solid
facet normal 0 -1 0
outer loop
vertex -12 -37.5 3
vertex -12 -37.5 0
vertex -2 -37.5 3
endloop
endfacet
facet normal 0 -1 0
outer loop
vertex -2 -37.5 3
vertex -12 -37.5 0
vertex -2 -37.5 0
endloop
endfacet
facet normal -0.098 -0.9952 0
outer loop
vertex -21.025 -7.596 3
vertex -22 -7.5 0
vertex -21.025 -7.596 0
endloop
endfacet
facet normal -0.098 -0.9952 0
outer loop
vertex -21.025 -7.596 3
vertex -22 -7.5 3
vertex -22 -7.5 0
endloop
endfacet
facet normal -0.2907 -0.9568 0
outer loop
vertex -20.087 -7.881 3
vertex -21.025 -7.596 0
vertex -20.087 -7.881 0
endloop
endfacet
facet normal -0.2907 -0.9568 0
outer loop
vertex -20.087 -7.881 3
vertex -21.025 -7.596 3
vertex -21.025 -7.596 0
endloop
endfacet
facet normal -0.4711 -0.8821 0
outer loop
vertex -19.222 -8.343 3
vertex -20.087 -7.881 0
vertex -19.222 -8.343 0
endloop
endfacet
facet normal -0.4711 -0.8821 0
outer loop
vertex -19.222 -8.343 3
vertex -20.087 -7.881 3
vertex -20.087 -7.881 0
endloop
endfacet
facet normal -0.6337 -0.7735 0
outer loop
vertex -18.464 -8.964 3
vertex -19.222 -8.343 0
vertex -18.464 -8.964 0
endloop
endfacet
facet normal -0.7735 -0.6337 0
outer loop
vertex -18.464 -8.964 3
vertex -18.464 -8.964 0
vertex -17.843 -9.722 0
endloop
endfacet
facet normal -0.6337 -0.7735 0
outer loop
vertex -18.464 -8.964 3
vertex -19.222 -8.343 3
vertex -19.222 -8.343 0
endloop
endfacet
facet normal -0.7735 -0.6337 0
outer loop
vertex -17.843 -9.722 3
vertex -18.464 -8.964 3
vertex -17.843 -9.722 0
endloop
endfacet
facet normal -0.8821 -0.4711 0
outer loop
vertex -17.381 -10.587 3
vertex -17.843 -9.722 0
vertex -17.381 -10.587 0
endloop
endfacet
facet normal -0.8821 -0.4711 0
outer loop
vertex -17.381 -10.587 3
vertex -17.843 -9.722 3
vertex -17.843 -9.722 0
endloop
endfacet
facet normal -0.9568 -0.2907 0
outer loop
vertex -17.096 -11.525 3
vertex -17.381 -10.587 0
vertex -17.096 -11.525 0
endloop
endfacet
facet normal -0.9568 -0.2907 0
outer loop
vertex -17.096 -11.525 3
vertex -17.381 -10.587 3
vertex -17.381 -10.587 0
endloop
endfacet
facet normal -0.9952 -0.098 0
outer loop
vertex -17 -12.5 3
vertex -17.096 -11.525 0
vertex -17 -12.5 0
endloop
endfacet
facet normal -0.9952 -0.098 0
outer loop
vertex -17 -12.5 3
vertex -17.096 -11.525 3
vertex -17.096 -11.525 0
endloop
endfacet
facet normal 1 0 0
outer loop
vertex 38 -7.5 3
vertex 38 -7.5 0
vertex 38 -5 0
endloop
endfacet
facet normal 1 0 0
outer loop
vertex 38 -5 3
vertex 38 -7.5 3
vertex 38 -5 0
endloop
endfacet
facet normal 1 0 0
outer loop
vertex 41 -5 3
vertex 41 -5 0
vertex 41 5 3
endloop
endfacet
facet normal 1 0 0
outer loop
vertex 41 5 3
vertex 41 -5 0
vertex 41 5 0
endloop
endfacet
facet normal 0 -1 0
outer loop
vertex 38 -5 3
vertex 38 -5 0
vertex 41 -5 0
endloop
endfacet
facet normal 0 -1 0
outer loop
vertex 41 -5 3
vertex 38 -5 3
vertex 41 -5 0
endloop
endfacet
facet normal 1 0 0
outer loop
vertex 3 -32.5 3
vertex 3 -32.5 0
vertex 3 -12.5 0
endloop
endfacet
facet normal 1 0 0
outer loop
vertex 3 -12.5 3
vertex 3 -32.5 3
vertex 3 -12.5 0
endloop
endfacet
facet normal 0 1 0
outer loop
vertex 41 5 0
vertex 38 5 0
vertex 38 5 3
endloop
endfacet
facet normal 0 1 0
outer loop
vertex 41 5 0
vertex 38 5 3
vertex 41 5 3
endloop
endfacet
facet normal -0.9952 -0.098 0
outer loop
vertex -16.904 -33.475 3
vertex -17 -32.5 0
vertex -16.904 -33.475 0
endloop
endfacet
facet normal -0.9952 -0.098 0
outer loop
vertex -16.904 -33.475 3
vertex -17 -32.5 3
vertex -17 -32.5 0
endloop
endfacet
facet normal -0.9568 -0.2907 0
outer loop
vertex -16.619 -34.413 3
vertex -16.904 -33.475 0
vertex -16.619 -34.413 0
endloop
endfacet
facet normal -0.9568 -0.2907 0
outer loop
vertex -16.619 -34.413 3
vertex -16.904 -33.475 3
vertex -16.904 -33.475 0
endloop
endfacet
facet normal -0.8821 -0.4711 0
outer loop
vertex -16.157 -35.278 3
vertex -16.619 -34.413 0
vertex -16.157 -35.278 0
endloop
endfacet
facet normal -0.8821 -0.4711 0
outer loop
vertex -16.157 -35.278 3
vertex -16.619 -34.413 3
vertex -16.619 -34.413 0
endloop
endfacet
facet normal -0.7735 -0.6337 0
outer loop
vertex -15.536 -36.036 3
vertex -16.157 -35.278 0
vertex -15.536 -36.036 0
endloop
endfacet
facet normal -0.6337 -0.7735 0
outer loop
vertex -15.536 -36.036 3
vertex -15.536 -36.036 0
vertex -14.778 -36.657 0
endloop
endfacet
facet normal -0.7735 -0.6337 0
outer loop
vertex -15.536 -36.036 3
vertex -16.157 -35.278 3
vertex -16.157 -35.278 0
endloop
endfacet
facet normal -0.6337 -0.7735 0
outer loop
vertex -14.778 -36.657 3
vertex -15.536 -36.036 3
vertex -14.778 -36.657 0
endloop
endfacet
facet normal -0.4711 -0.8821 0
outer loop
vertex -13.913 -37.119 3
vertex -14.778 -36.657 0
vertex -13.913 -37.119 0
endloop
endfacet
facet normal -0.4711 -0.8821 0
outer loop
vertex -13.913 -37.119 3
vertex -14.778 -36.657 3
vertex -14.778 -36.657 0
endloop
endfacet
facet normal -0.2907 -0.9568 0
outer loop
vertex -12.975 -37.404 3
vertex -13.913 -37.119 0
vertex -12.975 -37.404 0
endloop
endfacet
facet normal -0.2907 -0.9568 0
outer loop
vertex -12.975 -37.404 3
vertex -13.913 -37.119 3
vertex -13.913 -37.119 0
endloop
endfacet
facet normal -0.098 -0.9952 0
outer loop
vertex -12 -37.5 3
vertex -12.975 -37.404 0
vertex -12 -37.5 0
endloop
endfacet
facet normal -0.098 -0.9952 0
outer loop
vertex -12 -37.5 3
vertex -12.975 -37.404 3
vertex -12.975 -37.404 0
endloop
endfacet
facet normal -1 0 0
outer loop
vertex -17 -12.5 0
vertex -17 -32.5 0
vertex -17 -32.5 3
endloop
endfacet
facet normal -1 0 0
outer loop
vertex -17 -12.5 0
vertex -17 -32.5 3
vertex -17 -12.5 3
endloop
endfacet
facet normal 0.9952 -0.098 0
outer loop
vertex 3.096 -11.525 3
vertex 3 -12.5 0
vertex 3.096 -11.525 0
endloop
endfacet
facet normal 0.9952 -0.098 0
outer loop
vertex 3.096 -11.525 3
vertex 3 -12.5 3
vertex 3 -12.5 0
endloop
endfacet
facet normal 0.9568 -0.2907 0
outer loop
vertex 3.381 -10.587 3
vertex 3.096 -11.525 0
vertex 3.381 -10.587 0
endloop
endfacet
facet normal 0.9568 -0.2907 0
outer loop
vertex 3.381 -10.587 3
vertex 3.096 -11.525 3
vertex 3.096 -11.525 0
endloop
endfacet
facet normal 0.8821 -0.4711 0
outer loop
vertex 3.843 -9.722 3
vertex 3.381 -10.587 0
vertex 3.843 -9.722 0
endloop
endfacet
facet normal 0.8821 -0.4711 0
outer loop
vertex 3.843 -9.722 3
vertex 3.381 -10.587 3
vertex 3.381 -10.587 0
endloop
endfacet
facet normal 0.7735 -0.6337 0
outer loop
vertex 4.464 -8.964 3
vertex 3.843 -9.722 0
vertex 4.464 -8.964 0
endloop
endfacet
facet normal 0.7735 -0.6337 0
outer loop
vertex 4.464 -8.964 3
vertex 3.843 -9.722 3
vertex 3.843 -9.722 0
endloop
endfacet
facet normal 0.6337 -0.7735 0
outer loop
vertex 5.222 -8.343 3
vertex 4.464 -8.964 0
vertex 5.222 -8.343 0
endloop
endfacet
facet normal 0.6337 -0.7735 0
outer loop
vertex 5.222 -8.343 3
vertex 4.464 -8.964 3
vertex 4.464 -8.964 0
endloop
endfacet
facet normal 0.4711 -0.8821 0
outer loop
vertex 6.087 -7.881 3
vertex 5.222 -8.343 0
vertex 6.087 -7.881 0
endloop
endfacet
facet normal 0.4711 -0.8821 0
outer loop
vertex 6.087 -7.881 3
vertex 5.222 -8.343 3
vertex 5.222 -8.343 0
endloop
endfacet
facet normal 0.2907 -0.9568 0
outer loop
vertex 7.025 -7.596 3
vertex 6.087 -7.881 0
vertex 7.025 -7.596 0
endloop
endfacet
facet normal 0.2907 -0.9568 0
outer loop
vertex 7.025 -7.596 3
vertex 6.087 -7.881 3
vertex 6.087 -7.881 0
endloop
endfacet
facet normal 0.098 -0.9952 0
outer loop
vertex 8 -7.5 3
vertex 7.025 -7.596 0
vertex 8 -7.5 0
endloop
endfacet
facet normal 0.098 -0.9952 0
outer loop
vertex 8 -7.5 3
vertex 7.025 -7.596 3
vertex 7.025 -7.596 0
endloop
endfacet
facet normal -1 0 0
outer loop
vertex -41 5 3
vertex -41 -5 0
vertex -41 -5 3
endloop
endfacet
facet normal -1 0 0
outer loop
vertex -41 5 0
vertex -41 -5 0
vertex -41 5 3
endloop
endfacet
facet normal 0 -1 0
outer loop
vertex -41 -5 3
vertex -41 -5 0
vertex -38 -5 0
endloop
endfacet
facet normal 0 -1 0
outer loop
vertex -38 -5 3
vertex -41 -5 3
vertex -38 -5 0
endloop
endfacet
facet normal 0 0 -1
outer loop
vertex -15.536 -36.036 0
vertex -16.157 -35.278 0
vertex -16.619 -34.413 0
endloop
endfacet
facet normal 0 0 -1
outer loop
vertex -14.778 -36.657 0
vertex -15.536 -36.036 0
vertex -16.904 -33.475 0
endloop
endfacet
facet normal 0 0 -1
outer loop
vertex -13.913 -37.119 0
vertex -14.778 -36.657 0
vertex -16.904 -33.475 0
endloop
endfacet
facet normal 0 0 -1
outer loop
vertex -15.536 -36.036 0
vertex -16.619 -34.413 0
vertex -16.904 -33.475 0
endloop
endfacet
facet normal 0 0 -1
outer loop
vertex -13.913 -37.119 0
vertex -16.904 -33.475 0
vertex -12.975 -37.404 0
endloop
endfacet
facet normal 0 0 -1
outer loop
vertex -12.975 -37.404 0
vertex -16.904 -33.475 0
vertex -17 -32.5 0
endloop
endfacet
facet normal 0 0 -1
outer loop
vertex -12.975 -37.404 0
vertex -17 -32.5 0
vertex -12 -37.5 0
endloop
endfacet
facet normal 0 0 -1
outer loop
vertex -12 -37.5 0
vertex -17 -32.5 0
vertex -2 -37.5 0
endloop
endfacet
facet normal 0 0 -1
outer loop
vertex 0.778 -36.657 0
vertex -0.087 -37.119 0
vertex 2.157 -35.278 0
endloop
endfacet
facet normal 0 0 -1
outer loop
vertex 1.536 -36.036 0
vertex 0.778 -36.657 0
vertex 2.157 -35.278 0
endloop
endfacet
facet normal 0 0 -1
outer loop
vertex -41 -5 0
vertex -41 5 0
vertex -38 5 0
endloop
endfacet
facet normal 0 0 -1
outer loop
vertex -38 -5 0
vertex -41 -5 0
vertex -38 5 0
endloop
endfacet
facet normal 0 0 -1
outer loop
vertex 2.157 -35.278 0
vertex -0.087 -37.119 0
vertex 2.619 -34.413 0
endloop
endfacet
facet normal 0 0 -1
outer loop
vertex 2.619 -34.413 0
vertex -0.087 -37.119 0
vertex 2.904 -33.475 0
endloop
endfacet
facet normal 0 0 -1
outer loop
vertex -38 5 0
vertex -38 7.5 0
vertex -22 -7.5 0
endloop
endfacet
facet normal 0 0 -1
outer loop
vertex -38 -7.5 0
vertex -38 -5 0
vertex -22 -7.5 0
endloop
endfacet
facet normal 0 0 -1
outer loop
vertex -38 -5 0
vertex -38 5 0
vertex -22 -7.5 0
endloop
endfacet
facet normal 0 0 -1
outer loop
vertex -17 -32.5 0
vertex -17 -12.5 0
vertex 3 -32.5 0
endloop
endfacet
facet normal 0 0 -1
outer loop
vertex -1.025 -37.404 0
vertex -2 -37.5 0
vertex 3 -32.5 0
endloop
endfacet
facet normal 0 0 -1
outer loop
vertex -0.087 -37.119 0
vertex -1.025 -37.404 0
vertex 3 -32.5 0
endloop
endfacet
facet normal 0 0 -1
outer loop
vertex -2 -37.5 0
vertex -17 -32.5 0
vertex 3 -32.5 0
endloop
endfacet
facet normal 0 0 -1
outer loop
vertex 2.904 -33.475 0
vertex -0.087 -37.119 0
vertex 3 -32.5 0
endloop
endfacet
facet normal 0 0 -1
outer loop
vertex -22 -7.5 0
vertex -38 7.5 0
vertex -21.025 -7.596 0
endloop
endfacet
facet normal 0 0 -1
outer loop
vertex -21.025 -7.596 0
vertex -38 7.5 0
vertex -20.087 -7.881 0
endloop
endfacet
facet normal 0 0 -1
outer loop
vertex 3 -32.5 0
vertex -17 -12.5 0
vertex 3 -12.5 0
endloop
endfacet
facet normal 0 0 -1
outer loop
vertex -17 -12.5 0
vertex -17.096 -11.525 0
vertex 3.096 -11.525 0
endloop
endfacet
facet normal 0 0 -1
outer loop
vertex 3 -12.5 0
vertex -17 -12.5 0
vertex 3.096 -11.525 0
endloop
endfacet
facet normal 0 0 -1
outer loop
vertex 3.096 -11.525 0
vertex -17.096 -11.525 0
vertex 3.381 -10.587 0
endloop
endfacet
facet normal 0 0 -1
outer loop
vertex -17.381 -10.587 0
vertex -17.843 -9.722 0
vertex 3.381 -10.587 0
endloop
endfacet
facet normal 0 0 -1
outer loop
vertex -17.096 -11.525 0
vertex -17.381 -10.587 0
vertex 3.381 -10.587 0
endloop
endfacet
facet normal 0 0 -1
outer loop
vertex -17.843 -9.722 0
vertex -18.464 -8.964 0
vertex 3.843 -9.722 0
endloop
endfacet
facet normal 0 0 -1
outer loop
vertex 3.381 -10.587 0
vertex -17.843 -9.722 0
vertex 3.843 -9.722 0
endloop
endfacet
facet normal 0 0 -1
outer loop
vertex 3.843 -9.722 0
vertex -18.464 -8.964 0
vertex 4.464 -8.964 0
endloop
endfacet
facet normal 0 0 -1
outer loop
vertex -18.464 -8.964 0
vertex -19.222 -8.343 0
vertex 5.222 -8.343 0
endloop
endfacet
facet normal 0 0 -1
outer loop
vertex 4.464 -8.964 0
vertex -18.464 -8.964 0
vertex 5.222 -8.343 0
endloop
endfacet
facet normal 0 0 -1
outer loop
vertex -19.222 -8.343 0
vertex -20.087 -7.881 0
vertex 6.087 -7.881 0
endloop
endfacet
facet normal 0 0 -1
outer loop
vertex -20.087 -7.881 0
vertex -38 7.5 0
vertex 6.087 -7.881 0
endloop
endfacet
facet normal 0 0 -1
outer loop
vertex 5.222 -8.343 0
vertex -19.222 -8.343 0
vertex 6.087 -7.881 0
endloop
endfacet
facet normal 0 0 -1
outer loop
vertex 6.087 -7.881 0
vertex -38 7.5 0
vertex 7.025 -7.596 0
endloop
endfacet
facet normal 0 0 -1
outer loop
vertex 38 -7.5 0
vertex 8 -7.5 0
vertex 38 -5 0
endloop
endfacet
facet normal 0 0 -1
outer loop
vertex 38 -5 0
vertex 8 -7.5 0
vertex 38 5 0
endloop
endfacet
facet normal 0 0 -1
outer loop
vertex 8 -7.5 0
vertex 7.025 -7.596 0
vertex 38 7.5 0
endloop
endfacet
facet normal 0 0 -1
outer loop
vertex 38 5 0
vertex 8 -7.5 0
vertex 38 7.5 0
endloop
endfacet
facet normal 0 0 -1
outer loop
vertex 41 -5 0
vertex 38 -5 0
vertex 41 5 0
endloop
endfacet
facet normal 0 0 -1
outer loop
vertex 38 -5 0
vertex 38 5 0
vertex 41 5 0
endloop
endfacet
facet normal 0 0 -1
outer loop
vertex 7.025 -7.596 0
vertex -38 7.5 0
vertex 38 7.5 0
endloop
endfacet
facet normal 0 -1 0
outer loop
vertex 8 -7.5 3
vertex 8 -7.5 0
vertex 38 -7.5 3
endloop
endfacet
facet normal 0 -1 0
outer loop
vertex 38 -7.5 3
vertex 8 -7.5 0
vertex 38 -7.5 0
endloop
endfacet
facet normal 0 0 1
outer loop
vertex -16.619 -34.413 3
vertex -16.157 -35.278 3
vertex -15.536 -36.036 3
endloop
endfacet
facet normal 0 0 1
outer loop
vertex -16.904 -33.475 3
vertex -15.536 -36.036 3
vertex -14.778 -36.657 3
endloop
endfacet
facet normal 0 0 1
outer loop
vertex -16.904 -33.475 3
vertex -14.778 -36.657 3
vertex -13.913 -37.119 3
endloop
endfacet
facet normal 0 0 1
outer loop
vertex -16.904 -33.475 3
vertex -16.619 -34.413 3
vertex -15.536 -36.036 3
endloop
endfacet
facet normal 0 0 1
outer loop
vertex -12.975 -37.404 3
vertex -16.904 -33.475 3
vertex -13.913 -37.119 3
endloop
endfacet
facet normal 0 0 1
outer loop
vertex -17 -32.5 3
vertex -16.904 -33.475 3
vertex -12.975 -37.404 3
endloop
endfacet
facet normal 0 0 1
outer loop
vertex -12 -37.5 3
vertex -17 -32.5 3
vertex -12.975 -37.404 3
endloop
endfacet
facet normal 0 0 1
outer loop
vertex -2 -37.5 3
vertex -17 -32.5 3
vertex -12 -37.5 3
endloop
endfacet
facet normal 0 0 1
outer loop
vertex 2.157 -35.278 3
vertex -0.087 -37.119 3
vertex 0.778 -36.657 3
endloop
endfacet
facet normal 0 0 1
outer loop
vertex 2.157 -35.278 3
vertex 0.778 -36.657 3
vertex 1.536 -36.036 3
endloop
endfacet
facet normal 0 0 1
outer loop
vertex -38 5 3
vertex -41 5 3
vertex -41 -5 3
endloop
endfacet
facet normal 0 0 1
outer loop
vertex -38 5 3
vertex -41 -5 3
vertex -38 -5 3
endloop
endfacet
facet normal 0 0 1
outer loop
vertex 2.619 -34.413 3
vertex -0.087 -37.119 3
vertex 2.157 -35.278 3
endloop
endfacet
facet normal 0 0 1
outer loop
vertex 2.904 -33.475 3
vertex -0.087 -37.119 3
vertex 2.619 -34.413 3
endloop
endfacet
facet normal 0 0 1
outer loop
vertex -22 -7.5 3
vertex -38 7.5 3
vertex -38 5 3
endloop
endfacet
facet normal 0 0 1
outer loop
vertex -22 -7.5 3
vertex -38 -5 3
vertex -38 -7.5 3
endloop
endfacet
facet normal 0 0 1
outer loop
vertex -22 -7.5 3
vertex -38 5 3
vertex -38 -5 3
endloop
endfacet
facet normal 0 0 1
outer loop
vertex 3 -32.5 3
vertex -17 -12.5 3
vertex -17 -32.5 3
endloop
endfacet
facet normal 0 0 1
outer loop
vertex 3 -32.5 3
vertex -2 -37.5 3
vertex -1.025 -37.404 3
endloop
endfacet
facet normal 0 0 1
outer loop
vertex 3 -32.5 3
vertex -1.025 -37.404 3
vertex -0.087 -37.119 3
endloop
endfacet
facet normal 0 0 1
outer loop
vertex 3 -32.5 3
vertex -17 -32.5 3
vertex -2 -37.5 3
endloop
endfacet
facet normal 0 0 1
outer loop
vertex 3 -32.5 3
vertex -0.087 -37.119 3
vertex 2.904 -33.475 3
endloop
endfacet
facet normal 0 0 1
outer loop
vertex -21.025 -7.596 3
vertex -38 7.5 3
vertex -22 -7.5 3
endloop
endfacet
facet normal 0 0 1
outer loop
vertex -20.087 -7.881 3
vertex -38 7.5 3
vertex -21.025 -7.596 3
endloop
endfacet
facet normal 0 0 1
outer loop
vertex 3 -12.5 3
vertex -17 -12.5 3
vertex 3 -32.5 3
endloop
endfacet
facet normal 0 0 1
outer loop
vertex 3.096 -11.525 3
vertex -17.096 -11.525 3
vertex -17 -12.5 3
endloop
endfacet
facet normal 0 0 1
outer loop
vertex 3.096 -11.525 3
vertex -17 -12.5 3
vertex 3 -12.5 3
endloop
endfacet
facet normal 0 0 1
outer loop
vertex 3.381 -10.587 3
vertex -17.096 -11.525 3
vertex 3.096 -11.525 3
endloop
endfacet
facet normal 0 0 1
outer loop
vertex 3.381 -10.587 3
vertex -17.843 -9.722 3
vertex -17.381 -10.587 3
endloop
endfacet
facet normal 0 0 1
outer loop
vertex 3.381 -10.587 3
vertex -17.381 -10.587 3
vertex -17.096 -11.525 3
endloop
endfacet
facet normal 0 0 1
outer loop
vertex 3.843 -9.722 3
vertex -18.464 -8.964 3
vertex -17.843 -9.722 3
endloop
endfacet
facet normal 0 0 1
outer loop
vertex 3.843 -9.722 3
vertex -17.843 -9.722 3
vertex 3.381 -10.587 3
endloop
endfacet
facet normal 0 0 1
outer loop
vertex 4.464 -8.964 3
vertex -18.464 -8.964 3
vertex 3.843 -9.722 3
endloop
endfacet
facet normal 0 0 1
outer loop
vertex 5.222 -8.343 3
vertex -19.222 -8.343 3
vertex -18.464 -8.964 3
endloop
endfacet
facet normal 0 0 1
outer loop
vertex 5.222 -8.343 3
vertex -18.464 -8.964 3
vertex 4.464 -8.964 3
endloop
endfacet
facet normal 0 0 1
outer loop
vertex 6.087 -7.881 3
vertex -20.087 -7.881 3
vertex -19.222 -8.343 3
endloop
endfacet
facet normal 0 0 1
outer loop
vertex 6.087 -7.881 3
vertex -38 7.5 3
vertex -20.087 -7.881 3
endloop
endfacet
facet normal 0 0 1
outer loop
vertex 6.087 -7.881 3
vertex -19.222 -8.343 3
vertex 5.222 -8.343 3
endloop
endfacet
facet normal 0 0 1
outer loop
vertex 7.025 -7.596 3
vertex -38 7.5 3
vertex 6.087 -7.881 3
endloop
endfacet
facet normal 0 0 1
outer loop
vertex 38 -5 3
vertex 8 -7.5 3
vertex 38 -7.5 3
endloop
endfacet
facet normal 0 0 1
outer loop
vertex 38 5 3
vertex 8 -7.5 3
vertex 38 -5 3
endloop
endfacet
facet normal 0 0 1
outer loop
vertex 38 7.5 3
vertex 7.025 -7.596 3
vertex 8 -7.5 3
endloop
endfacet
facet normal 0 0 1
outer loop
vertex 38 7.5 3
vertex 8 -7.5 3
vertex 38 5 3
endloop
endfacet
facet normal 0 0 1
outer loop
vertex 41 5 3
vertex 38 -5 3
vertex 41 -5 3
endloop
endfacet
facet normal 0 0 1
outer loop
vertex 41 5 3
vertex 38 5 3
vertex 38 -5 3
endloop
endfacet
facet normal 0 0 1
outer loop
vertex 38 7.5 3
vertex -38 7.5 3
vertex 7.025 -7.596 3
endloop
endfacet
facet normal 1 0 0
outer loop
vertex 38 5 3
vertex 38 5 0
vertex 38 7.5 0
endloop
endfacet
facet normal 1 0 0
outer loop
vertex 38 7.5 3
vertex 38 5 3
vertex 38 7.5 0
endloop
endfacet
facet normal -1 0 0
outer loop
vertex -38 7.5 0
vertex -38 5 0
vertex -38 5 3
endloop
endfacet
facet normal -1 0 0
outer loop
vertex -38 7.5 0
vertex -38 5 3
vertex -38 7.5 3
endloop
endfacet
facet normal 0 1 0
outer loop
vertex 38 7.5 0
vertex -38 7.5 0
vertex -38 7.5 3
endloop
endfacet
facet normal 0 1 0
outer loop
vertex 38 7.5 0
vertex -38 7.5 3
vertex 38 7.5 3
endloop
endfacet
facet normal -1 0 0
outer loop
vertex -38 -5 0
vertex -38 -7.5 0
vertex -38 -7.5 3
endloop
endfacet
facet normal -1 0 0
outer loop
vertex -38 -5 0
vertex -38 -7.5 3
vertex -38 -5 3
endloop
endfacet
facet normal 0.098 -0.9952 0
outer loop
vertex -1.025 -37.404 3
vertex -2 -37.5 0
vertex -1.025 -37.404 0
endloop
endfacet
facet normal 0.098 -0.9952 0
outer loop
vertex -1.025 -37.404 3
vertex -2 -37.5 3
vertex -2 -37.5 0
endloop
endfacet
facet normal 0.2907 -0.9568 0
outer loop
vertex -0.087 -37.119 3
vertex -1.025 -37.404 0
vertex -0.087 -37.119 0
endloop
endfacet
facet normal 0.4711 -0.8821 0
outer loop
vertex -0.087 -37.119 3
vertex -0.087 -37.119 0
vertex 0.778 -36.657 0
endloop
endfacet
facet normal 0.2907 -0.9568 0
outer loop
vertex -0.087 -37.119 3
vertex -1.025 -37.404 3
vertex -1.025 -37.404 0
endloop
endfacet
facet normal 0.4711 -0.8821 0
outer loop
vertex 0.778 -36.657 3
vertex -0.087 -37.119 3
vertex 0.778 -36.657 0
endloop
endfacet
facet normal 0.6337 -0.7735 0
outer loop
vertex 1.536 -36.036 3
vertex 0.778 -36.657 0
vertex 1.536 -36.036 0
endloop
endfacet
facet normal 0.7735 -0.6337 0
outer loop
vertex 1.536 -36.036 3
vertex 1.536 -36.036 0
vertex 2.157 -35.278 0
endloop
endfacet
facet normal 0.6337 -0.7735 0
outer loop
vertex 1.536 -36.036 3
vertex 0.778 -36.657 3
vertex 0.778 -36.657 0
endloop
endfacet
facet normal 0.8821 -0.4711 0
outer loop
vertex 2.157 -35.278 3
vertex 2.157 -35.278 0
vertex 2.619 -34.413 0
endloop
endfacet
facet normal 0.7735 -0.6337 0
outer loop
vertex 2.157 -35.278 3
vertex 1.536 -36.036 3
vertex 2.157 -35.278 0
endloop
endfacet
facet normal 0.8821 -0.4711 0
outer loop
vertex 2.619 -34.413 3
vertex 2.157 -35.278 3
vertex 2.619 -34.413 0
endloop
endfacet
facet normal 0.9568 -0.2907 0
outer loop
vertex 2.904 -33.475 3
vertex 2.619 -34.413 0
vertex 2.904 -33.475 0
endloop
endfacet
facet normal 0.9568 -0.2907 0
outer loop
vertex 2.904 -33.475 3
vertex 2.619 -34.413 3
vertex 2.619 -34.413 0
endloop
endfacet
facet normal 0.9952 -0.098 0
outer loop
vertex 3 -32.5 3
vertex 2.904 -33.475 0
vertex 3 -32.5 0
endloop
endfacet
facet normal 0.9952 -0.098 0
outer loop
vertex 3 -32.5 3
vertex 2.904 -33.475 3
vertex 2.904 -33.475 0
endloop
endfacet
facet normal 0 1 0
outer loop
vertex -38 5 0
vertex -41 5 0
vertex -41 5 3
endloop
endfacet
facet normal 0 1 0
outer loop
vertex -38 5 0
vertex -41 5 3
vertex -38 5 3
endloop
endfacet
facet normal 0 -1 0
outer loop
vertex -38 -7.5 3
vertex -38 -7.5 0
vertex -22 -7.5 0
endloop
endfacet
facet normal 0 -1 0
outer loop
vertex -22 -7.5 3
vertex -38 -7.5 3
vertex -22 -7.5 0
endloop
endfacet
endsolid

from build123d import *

# Parameters (mm, degrees)
ESBO_O1_W                = 76
ESBO_O1_H                = 15
ESBO_O1_W_2              = 20
ESBO_O1_H_2              = 30
ESBO_O1_W_3              = 3
ESBO_O1_H_3              = 10
RESSALTO_EXTRUS_O1_DEPTH = 3
FILETE1_R                = 5


with BuildPart() as part:
    # Esboço1 → Ressalto-extrusão1 (new body)
    with BuildSketch(Plane.XY):
        Rectangle(ESBO_O1_W, ESBO_O1_H)
        with Locations((-7, -22.5)):
            Rectangle(ESBO_O1_W_2, ESBO_O1_H_2)
        with Locations((39.5, 0)):
            Rectangle(ESBO_O1_W_3, ESBO_O1_H_3)
        with Locations((-39.5, 0)):
            Rectangle(ESBO_O1_W_3, ESBO_O1_H_3)
    extrude(amount=RESSALTO_EXTRUS_O1_DEPTH)

    # Filete1
    filete1_edges = [part.edges().sort_by_distance(p)[0] for p in [
        (3, -7.5, 1.5),
        (3, -37.5, 1.5),
        (-17, -37.5, 1.5),
        (-17, -7.5, 1.5),
    ]]
    fillet(filete1_edges, radius=FILETE1_R)


solid = part.part
